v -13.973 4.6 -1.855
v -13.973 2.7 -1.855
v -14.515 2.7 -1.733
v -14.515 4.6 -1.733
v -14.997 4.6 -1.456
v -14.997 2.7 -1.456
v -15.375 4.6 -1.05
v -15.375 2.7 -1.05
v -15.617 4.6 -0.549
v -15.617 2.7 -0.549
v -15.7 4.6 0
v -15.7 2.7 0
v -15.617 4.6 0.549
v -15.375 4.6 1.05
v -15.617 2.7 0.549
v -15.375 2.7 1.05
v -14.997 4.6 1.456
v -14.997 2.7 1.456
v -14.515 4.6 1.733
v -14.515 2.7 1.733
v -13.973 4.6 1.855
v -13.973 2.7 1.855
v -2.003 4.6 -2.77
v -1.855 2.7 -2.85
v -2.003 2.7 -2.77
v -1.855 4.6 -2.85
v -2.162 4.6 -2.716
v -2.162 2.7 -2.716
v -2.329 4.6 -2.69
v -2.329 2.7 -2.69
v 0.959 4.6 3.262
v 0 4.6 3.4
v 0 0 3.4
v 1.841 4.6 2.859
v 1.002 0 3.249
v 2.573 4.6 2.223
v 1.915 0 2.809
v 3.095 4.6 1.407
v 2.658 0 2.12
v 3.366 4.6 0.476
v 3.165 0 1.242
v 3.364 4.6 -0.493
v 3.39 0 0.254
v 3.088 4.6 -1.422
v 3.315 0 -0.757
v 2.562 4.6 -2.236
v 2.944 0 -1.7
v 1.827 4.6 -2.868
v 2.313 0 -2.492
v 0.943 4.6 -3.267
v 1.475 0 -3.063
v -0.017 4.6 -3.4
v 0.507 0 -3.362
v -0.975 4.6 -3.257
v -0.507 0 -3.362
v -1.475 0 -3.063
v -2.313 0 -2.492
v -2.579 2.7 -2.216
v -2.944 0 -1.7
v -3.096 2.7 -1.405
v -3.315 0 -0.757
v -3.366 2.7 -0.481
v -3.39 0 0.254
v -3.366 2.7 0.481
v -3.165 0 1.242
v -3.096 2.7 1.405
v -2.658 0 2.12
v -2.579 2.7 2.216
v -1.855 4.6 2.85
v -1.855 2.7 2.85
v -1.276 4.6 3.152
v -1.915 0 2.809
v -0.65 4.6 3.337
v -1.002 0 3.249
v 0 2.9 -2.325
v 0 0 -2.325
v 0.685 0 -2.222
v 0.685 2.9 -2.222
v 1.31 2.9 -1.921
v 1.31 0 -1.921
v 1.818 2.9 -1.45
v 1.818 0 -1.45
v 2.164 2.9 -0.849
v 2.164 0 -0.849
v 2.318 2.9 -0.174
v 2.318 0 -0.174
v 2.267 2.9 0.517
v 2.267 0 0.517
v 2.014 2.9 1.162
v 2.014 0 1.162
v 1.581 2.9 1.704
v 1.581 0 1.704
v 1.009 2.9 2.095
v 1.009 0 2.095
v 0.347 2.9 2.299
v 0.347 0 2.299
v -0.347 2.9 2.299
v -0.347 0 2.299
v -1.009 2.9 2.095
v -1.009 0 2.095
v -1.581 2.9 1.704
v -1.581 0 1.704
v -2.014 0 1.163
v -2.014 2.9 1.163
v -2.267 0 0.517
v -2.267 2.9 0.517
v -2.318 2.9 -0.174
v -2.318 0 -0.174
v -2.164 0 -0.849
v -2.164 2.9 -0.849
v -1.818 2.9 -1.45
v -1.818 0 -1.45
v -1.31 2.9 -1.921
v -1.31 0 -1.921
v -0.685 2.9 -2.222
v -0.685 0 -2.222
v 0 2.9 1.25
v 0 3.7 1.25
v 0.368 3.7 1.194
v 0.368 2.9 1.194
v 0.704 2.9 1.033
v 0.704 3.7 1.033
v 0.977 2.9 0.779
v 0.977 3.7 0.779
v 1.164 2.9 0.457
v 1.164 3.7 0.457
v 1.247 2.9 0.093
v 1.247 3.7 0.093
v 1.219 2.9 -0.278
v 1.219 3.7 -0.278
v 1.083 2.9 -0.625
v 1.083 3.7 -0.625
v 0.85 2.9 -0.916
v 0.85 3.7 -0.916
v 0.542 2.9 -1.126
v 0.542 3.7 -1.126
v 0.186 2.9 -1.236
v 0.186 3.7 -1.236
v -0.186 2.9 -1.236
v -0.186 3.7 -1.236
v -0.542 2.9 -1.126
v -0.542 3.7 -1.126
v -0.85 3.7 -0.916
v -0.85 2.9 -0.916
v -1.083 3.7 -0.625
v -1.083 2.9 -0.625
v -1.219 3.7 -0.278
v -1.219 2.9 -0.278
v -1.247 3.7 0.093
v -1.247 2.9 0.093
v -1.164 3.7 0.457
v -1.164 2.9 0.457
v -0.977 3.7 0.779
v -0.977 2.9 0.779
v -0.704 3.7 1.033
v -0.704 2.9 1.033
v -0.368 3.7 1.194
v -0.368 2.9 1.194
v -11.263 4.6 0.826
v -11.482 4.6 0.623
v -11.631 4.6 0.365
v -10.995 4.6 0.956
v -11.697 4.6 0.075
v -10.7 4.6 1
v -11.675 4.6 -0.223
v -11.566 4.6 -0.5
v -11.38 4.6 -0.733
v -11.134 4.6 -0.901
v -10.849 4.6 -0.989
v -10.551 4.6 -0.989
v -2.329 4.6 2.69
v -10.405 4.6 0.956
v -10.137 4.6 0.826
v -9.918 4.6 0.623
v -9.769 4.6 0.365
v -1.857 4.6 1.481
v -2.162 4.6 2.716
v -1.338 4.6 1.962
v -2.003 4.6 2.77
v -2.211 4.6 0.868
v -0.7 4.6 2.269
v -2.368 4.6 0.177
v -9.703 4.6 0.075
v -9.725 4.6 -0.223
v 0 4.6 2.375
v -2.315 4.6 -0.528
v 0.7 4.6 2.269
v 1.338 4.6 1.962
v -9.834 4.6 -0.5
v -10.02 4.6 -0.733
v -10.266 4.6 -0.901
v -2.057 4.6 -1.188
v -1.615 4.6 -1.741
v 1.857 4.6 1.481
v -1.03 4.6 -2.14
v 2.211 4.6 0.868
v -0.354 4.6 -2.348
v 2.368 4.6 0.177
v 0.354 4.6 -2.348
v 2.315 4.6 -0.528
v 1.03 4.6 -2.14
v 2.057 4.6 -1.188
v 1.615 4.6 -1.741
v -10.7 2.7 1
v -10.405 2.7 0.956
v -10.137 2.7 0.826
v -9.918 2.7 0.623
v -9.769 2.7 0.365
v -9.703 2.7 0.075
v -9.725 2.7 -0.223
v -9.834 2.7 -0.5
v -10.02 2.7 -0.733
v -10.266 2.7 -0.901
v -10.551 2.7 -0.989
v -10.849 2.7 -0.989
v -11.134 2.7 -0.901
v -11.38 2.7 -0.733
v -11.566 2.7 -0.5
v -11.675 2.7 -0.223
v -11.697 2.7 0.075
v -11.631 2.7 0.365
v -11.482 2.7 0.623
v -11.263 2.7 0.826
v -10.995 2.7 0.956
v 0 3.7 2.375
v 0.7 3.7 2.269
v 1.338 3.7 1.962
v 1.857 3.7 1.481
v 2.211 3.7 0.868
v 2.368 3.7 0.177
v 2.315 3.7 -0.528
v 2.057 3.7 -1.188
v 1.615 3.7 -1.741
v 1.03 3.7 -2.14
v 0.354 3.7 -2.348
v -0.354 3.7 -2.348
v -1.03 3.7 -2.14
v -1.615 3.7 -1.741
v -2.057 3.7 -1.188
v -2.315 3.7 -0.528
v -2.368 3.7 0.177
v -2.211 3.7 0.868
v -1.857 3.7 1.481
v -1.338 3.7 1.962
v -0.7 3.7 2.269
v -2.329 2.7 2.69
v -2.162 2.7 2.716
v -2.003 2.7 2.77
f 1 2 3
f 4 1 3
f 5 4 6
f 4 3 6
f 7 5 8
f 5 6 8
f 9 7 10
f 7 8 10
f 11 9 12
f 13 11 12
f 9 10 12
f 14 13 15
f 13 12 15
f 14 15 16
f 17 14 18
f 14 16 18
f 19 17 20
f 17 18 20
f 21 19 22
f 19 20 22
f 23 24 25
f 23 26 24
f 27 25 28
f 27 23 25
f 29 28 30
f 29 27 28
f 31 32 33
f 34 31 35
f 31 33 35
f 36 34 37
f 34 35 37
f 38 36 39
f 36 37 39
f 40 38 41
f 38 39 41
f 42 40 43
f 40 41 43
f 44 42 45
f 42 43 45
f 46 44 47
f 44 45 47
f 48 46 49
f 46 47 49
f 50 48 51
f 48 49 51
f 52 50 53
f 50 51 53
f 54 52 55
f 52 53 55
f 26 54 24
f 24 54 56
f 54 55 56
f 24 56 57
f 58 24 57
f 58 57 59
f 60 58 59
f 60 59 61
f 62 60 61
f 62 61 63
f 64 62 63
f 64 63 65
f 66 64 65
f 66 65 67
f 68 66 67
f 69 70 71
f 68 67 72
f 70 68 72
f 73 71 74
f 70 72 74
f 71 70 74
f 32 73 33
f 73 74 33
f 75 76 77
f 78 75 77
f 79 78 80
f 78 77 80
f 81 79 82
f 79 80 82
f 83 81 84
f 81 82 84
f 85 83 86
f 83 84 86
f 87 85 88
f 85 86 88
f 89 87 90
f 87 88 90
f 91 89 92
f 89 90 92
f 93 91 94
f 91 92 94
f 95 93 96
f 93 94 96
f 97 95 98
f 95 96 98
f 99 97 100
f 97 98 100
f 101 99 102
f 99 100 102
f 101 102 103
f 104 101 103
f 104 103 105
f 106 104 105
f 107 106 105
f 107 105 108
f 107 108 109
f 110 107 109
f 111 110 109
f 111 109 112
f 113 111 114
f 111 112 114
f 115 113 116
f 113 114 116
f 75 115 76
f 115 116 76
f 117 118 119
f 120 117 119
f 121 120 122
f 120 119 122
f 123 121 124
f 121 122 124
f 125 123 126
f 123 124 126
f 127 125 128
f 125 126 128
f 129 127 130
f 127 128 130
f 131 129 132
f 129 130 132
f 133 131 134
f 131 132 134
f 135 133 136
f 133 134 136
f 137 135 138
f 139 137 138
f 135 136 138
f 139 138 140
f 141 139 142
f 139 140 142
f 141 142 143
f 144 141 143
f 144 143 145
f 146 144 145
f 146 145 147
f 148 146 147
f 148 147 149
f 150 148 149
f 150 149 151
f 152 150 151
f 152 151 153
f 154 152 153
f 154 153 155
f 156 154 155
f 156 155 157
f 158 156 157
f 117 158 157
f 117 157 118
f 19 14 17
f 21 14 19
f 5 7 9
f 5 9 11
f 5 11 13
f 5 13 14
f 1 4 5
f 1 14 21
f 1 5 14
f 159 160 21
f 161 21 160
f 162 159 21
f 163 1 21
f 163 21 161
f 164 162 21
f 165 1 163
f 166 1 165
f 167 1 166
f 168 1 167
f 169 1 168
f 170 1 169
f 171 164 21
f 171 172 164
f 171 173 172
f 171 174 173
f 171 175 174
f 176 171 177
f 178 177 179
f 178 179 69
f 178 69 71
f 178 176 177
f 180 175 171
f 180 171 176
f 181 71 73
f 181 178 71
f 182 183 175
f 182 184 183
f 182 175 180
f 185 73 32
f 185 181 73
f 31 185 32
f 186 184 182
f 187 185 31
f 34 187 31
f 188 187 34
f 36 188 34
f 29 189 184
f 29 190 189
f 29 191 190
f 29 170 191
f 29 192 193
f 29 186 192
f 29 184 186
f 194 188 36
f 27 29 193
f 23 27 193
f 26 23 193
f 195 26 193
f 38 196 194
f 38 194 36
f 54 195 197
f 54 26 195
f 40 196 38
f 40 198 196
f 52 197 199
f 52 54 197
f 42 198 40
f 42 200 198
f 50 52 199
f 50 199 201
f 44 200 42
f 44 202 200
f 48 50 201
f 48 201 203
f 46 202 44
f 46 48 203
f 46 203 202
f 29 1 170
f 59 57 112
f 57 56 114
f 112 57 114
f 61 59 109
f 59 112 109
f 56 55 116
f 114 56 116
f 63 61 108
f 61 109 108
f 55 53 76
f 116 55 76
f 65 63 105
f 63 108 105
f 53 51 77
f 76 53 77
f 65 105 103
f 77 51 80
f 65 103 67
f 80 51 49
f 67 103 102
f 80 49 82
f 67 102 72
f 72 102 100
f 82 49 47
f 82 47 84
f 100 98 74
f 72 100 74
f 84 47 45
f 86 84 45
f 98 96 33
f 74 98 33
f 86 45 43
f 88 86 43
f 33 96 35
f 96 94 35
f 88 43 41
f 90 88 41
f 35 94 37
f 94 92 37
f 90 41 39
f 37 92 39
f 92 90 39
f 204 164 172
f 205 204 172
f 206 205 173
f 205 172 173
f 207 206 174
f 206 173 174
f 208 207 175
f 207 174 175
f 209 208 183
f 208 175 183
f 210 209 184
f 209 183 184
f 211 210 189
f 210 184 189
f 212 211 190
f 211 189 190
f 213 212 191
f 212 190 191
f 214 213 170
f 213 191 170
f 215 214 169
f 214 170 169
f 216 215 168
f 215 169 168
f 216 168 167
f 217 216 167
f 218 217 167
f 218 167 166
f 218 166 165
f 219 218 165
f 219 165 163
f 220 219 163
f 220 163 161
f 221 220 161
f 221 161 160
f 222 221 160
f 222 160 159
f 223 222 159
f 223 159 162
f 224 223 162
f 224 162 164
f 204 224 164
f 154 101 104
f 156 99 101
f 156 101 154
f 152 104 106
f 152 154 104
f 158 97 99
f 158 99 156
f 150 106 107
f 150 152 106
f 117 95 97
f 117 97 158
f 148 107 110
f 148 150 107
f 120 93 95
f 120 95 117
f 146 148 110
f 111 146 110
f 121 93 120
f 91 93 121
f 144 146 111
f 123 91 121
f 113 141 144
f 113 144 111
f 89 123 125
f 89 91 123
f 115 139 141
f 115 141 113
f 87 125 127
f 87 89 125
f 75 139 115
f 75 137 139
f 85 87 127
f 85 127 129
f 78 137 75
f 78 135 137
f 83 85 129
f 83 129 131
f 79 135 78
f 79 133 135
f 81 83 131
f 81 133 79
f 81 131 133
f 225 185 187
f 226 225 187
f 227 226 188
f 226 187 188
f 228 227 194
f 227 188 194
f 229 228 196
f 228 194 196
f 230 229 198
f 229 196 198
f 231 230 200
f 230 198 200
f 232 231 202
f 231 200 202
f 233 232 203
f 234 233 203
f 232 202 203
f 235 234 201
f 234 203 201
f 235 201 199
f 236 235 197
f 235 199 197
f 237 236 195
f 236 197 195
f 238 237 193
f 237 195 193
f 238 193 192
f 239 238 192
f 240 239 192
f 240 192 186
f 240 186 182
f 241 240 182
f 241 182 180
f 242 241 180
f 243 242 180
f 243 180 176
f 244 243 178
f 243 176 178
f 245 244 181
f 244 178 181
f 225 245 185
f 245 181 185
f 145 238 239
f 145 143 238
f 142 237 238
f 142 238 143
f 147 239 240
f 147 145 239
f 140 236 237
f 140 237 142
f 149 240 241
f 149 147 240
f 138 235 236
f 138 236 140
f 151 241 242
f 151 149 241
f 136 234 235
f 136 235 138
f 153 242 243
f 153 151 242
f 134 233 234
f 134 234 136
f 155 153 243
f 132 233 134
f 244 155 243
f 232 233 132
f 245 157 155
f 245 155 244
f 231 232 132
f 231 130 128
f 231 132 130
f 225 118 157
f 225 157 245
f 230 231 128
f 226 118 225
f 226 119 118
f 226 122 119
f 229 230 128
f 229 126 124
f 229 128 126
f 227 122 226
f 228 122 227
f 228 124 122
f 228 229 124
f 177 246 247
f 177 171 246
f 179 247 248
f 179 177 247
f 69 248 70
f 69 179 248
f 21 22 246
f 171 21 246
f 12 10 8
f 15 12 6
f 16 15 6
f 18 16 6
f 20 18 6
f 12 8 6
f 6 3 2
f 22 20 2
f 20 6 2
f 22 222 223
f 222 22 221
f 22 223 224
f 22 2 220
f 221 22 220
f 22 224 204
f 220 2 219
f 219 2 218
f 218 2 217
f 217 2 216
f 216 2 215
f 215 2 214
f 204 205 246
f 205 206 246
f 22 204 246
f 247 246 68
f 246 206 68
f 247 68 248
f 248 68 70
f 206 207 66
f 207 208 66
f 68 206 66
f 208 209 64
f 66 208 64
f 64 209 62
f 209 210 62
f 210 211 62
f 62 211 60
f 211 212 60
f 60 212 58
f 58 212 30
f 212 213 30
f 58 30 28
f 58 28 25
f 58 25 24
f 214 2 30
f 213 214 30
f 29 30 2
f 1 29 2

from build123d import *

# Parameters (mm, degrees)
SKETCH1_R           = 3.4
BOSS_EXTRUDE1_DEPTH = 4.6
BOSS_EXTRUDE2_START = -1.9
BOSS_EXTRUDE2_DEPTH = 1.9
SKETCH4_R           = 2.325
CUT_EXTRUDE1_DEPTH  = 2.9
FILLET1_R           = 1
CUT_EXTRUDE2_REACH  = 18.71
SKETCH5_R           = 1.25
SKETCH6_R           = 2.375
CUT_EXTRUDE3_DEPTH  = 0.9
CUT_EXTRUDE4_REACH  = 18.71
SKETCH7_R           = 1


with BuildPart() as part:
    # Sketch1 → Boss-Extrude1 (new body)
    with BuildSketch(Plane(origin=(0, 0, 0), x_dir=(1, 0, 0), z_dir=(0, 1, 0))):
        with Locations(Location((0, 0, 0), (0, 0, 270))):
            Circle(SKETCH1_R)
    extrude(amount=BOSS_EXTRUDE1_DEPTH)

    # Sketch3 → Boss-Extrude2 (add)
    with BuildSketch(Plane(origin=(0, 4.6, 0), x_dir=(1, 0, 0), z_dir=(0, 1, 0)).offset(BOSS_EXTRUDE2_START)):
        with BuildLine():
            Line((-13.973038518, -1.855236037), (-2.053265692, -2.71))
            ThreePointArc((-2.053265692, -2.71), (3.4, 0), (-2.053265692, 2.71))
            Line((-2.053265692, 2.71), (-13.973038518, 1.855236037))
            ThreePointArc((-13.973038518, 1.855236037), (-15.7, 0), (-13.973038518, -1.855236037))
        make_face()
    extrude(amount=BOSS_EXTRUDE2_DEPTH)

    # Sketch4 → Cut-Extrude1 (cut)
    with BuildSketch(Plane.XZ):
        with Locations(Location((0, 0, 0), (0, 0, 270))):
            Circle(SKETCH4_R)
    extrude(amount=-CUT_EXTRUDE1_DEPTH, mode=Mode.SUBTRACT)

    # Fillet1
    fillet1_edges = [part.edges().sort_by_distance(p)[0] for p in [
        (-2.053265692, 3.65, -2.71),
        (-2.053265692, 3.65, 2.71),
    ]]
    fillet(fillet1_edges, radius=FILLET1_R)

    # Sketch5 → Cut-Extrude2 (cut, up to next)
    with BuildSketch(Plane(origin=(0, 4.6, 0), x_dir=(1, 0, 0), z_dir=(0, 1, 0)), mode=Mode.PRIVATE) as cut_extrude2_sk1:
        with Locations(Location((0, 0, 0), (0, 0, 270))):
            Circle(SKETCH5_R)
    cut_extrude2_tool1 = extrude(cut_extrude2_sk1.sketch, amount=-CUT_EXTRUDE2_REACH, mode=Mode.PRIVATE) & part.part
    add(cut_extrude2_tool1.solids().sort_by_distance((0, 4.6, 0))[0], mode=Mode.SUBTRACT)

    # Sketch6 → Cut-Extrude3 (cut)
    with BuildSketch(Plane(origin=(0, 4.6, 0), x_dir=(1, 0, 0), z_dir=(0, 1, 0))):
        with Locations(Location((0, 0, 0), (0, 0, 270))):
            Circle(SKETCH6_R)
    extrude(amount=-CUT_EXTRUDE3_DEPTH, mode=Mode.SUBTRACT)

    # Sketch7 → Cut-Extrude4 (cut, up to next)
    with BuildSketch(Plane(origin=(0, 4.6, 0), x_dir=(1, 0, 0), z_dir=(0, 1, 0)), mode=Mode.PRIVATE) as cut_extrude4_sk1:
        with Locations(Location((-10.7, 0, 0), (0, 0, 270))):
            Circle(SKETCH7_R)
    cut_extrude4_tool1 = extrude(cut_extrude4_sk1.sketch, amount=-CUT_EXTRUDE4_REACH, mode=Mode.PRIVATE) & part.part
    add(cut_extrude4_tool1.solids().sort_by_distance((-10.7, 4.6, 0))[0], mode=Mode.SUBTRACT)


solid = part.part
